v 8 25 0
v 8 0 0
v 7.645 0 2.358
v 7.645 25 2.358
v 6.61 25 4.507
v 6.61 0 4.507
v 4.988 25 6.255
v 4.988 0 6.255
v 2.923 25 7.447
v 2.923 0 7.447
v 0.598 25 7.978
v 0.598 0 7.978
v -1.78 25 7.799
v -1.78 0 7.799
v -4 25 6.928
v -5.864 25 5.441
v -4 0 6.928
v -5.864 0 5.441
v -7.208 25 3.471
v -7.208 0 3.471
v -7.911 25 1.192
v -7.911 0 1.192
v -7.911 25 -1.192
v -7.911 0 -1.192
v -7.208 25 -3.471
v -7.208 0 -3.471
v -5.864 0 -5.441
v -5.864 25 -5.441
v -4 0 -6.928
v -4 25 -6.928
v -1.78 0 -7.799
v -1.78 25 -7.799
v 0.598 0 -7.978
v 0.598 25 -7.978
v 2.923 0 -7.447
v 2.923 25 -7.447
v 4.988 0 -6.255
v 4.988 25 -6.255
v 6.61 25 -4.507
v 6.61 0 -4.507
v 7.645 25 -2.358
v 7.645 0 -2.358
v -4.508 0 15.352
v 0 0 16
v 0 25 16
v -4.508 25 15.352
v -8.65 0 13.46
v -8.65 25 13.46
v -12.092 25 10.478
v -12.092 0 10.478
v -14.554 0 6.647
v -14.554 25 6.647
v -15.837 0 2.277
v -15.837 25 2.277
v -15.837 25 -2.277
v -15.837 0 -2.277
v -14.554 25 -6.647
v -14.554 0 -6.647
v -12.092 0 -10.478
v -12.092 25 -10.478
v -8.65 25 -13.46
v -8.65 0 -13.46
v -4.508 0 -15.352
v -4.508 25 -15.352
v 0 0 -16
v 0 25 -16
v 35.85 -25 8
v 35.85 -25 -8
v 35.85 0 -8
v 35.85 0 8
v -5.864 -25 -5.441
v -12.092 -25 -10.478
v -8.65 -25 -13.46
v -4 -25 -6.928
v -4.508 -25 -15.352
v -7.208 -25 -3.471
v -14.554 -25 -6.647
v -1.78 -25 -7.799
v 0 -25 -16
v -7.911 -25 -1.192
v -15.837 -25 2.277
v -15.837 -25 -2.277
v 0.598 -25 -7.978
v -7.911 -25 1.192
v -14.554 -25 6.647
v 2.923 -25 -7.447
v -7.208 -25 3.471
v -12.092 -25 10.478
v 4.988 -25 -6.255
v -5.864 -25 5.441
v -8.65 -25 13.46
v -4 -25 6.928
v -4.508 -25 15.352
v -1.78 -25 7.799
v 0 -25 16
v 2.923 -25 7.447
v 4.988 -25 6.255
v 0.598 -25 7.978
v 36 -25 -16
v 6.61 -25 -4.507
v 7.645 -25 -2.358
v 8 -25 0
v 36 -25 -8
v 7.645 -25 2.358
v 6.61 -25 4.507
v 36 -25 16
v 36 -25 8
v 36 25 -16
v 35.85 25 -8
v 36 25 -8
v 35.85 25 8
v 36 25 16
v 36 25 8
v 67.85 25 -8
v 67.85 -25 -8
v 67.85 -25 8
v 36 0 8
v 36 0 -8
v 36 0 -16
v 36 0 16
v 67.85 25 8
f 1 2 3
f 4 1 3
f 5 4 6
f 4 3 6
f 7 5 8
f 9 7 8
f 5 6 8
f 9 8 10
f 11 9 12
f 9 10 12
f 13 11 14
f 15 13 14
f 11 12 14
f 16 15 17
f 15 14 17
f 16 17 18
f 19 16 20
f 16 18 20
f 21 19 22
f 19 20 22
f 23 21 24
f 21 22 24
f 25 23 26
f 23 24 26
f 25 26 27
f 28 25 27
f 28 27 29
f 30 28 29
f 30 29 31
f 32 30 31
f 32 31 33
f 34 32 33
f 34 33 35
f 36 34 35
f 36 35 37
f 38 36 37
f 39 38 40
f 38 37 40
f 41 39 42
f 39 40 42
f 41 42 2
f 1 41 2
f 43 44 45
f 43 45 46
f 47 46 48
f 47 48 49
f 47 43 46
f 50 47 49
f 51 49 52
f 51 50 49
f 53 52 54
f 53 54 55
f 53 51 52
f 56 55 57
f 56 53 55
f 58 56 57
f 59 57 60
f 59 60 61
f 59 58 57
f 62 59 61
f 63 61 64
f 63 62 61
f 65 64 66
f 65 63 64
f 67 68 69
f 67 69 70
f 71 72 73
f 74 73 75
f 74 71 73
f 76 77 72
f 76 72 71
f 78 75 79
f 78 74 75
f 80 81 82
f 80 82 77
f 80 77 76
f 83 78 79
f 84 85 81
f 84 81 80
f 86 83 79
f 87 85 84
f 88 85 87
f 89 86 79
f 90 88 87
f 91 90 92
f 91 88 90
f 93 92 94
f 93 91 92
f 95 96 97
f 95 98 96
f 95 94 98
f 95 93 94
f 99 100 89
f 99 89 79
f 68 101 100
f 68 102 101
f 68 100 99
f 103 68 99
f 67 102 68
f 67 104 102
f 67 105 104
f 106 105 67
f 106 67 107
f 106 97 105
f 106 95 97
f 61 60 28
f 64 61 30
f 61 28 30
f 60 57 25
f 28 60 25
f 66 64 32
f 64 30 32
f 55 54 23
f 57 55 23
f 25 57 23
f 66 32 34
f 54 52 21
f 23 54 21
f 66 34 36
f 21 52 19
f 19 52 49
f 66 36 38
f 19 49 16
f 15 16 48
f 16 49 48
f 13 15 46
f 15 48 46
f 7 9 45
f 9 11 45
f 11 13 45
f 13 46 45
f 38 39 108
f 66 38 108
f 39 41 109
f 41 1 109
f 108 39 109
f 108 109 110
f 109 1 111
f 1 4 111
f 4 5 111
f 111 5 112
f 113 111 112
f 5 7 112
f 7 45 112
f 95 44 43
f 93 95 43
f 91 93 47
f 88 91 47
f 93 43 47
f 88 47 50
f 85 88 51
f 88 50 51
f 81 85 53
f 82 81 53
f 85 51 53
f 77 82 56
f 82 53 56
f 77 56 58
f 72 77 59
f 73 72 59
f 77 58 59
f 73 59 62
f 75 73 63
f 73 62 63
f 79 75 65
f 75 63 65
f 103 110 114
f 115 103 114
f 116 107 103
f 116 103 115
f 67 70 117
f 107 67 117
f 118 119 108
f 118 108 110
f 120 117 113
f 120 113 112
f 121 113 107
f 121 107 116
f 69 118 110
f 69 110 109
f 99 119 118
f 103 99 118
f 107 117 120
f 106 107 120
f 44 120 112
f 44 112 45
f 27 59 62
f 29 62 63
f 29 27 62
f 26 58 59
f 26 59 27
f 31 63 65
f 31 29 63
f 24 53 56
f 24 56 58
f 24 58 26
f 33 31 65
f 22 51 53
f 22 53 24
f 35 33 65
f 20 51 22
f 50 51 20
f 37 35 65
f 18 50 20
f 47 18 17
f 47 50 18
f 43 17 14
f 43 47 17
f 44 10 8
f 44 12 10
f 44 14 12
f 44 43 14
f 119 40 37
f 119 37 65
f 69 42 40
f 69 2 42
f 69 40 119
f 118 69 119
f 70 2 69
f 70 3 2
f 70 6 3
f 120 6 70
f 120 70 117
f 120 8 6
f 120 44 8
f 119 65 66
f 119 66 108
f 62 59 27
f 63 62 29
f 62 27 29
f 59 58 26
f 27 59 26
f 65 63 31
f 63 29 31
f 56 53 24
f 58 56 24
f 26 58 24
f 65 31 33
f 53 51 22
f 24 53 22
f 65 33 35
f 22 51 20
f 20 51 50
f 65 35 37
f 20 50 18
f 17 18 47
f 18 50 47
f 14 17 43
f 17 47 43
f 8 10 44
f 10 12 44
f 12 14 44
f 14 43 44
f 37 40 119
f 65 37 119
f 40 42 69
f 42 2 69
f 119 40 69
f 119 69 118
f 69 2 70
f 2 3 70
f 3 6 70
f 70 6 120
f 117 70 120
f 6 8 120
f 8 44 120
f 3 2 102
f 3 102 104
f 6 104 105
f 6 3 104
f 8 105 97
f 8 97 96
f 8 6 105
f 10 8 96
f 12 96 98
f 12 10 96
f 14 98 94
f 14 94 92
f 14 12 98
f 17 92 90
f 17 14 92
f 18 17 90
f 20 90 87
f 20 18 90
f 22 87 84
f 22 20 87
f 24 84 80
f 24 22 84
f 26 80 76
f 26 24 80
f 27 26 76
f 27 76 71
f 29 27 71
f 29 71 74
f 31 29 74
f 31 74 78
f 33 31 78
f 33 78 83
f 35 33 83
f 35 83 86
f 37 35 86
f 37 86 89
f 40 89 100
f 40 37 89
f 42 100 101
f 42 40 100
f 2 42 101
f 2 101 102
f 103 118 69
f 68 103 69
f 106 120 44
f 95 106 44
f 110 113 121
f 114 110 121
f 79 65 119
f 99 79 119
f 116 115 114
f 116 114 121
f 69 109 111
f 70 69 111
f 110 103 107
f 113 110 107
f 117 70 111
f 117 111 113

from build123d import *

# Parameters (mm, degrees)
F0_W     = 31.8502481282
F0_H     = 16
F1_DEPTH = 25
F0_R     = 8


with BuildPart() as f1:
    # F0 (on Front) → F1 (new body)
    with BuildSketch(Plane.XZ):
        with Locations((51.9251240641, 0)):
            Rectangle(F0_W, F0_H)
    extrude(amount=F1_DEPTH)

    # F3: F1 across plane


with BuildPart() as f1b:
    # F0 (on Front) → F1, piece 2 (new body)
    with BuildSketch(Plane.XZ):
        with BuildLine():
            Line((36, 16), (0, 16))
            ThreePointArc((0, 16), (-16, 0), (0, -16))
            Line((0, -16), (36, -16))
            Line((36, -16), (36, -8))
            Line((36, -8), (35.8502481282, -8))
            Line((35.8502481282, -8), (35.8502481282, 8))
            Line((35.8502481282, 8), (36, 8))
            Line((36, 8), (36, 16))
        make_face()
        Circle(F0_R, mode=Mode.SUBTRACT)
    extrude(amount=F1_DEPTH)


with BuildPart() as f2_1:
    # F2: instance of F1b
    add(f1b.part.mirror(Plane.XZ))


with BuildPart() as f1_1:
    add(f1.part)
    add(f1.part.mirror(Plane.XZ))


solid = Compound([f1b.part, f2_1.part, f1_1.part])
